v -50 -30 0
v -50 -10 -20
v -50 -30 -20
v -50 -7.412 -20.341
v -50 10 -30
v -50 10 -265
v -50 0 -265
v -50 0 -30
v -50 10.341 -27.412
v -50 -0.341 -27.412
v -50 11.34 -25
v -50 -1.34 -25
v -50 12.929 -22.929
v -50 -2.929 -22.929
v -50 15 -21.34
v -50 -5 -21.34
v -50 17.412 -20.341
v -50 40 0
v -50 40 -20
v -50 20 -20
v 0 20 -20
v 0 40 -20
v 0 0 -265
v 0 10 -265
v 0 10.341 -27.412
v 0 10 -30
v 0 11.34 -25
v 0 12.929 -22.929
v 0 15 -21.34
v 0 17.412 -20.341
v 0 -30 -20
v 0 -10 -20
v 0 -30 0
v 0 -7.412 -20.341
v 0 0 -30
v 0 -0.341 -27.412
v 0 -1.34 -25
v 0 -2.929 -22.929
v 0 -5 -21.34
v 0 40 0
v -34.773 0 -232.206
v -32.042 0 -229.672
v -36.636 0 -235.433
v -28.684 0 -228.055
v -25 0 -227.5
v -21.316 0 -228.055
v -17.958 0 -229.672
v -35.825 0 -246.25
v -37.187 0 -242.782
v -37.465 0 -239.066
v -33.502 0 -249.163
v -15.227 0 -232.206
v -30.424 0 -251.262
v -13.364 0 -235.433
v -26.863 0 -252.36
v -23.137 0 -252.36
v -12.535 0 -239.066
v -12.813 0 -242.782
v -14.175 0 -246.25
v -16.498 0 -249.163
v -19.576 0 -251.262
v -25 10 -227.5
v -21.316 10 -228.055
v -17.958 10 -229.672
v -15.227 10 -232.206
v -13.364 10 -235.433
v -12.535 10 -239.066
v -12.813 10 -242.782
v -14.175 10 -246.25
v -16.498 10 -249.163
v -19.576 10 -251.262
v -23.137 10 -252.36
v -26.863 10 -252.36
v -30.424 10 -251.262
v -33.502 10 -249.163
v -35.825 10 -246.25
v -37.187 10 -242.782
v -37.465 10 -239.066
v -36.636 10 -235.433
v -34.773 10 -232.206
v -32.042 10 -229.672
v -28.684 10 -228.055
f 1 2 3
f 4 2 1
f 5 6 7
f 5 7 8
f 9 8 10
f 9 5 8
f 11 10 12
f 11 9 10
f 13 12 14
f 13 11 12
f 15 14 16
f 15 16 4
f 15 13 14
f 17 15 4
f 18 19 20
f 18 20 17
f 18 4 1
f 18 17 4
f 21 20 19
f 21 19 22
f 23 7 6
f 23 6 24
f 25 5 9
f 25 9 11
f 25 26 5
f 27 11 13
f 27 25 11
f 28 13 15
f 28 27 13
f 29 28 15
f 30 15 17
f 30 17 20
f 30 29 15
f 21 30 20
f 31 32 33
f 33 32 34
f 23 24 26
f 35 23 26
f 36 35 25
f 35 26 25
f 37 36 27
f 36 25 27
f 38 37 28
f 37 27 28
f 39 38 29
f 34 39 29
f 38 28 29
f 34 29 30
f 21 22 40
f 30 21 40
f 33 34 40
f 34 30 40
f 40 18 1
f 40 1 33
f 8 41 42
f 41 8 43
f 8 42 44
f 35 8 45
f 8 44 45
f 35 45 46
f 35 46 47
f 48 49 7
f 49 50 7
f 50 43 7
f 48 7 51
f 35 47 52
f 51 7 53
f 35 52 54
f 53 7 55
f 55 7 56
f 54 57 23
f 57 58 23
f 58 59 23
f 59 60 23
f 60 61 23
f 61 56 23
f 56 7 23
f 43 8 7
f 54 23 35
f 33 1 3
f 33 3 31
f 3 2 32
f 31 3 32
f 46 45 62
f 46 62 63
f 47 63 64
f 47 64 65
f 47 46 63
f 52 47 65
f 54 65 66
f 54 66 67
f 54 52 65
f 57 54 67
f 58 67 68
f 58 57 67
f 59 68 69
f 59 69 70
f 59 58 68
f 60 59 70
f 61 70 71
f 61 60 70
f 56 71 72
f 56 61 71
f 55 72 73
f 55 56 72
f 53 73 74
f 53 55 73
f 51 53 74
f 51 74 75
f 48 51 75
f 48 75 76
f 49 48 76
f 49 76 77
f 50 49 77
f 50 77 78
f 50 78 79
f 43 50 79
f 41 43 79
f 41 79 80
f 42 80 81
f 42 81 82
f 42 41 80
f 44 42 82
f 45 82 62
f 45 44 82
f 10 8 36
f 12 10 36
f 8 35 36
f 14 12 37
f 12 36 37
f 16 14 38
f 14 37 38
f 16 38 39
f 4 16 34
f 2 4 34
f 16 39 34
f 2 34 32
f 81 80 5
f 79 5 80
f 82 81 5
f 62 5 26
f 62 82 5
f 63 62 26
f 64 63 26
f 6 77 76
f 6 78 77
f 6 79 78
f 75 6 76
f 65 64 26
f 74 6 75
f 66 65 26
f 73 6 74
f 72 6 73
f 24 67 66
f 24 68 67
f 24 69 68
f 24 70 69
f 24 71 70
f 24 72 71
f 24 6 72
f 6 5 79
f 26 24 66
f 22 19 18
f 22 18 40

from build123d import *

# Parameters (mm, degrees)
SKETCH1_W           = 50
SKETCH1_H           = 265
SKETCH1_R           = 12.5
BOSS_EXTRUDE1_DEPTH = 10
SKETCH2_W           = 50
SKETCH2_H           = 20
BOSS_EXTRUDE2_DEPTH = 30
SKETCH3_W           = 50
SKETCH3_H           = 20
BOSS_EXTRUDE3_DEPTH = 30
FILLET1_R           = 10


with BuildPart() as part:
    # Sketch1 → Boss-Extrude1 (new body)
    with BuildSketch(Plane(origin=(0, 0, 0), x_dir=(1, 0, 0), z_dir=(0, 1, 0))):
        with Locations((-25, 132.5)):
            Rectangle(SKETCH1_W, SKETCH1_H)
        with Locations(Location((-25, 240, 0), (0, 0, 270))):
            Circle(SKETCH1_R, mode=Mode.SUBTRACT)
    extrude(amount=BOSS_EXTRUDE1_DEPTH)

    # Sketch2 → Boss-Extrude2 (add)
    with BuildSketch(Plane(origin=(0, 10, 0), x_dir=(1, 0, 0), z_dir=(0, 1, 0))):
        with Locations((-25, 10)):
            Rectangle(SKETCH2_W, SKETCH2_H)
    extrude(amount=BOSS_EXTRUDE2_DEPTH)

    # Sketch3 → Boss-Extrude3 (add)
    with BuildSketch(Plane.XZ):
        with Locations((-25, -10)):
            Rectangle(SKETCH3_W, SKETCH3_H)
    extrude(amount=BOSS_EXTRUDE3_DEPTH)

    # Fillet1
    fillet1_edges = [part.edges().sort_by_distance(p)[0] for p in [
        (-25, 10, -20),
        (-25, 0, -20),
    ]]
    fillet(fillet1_edges, radius=FILLET1_R)


solid = part.part
